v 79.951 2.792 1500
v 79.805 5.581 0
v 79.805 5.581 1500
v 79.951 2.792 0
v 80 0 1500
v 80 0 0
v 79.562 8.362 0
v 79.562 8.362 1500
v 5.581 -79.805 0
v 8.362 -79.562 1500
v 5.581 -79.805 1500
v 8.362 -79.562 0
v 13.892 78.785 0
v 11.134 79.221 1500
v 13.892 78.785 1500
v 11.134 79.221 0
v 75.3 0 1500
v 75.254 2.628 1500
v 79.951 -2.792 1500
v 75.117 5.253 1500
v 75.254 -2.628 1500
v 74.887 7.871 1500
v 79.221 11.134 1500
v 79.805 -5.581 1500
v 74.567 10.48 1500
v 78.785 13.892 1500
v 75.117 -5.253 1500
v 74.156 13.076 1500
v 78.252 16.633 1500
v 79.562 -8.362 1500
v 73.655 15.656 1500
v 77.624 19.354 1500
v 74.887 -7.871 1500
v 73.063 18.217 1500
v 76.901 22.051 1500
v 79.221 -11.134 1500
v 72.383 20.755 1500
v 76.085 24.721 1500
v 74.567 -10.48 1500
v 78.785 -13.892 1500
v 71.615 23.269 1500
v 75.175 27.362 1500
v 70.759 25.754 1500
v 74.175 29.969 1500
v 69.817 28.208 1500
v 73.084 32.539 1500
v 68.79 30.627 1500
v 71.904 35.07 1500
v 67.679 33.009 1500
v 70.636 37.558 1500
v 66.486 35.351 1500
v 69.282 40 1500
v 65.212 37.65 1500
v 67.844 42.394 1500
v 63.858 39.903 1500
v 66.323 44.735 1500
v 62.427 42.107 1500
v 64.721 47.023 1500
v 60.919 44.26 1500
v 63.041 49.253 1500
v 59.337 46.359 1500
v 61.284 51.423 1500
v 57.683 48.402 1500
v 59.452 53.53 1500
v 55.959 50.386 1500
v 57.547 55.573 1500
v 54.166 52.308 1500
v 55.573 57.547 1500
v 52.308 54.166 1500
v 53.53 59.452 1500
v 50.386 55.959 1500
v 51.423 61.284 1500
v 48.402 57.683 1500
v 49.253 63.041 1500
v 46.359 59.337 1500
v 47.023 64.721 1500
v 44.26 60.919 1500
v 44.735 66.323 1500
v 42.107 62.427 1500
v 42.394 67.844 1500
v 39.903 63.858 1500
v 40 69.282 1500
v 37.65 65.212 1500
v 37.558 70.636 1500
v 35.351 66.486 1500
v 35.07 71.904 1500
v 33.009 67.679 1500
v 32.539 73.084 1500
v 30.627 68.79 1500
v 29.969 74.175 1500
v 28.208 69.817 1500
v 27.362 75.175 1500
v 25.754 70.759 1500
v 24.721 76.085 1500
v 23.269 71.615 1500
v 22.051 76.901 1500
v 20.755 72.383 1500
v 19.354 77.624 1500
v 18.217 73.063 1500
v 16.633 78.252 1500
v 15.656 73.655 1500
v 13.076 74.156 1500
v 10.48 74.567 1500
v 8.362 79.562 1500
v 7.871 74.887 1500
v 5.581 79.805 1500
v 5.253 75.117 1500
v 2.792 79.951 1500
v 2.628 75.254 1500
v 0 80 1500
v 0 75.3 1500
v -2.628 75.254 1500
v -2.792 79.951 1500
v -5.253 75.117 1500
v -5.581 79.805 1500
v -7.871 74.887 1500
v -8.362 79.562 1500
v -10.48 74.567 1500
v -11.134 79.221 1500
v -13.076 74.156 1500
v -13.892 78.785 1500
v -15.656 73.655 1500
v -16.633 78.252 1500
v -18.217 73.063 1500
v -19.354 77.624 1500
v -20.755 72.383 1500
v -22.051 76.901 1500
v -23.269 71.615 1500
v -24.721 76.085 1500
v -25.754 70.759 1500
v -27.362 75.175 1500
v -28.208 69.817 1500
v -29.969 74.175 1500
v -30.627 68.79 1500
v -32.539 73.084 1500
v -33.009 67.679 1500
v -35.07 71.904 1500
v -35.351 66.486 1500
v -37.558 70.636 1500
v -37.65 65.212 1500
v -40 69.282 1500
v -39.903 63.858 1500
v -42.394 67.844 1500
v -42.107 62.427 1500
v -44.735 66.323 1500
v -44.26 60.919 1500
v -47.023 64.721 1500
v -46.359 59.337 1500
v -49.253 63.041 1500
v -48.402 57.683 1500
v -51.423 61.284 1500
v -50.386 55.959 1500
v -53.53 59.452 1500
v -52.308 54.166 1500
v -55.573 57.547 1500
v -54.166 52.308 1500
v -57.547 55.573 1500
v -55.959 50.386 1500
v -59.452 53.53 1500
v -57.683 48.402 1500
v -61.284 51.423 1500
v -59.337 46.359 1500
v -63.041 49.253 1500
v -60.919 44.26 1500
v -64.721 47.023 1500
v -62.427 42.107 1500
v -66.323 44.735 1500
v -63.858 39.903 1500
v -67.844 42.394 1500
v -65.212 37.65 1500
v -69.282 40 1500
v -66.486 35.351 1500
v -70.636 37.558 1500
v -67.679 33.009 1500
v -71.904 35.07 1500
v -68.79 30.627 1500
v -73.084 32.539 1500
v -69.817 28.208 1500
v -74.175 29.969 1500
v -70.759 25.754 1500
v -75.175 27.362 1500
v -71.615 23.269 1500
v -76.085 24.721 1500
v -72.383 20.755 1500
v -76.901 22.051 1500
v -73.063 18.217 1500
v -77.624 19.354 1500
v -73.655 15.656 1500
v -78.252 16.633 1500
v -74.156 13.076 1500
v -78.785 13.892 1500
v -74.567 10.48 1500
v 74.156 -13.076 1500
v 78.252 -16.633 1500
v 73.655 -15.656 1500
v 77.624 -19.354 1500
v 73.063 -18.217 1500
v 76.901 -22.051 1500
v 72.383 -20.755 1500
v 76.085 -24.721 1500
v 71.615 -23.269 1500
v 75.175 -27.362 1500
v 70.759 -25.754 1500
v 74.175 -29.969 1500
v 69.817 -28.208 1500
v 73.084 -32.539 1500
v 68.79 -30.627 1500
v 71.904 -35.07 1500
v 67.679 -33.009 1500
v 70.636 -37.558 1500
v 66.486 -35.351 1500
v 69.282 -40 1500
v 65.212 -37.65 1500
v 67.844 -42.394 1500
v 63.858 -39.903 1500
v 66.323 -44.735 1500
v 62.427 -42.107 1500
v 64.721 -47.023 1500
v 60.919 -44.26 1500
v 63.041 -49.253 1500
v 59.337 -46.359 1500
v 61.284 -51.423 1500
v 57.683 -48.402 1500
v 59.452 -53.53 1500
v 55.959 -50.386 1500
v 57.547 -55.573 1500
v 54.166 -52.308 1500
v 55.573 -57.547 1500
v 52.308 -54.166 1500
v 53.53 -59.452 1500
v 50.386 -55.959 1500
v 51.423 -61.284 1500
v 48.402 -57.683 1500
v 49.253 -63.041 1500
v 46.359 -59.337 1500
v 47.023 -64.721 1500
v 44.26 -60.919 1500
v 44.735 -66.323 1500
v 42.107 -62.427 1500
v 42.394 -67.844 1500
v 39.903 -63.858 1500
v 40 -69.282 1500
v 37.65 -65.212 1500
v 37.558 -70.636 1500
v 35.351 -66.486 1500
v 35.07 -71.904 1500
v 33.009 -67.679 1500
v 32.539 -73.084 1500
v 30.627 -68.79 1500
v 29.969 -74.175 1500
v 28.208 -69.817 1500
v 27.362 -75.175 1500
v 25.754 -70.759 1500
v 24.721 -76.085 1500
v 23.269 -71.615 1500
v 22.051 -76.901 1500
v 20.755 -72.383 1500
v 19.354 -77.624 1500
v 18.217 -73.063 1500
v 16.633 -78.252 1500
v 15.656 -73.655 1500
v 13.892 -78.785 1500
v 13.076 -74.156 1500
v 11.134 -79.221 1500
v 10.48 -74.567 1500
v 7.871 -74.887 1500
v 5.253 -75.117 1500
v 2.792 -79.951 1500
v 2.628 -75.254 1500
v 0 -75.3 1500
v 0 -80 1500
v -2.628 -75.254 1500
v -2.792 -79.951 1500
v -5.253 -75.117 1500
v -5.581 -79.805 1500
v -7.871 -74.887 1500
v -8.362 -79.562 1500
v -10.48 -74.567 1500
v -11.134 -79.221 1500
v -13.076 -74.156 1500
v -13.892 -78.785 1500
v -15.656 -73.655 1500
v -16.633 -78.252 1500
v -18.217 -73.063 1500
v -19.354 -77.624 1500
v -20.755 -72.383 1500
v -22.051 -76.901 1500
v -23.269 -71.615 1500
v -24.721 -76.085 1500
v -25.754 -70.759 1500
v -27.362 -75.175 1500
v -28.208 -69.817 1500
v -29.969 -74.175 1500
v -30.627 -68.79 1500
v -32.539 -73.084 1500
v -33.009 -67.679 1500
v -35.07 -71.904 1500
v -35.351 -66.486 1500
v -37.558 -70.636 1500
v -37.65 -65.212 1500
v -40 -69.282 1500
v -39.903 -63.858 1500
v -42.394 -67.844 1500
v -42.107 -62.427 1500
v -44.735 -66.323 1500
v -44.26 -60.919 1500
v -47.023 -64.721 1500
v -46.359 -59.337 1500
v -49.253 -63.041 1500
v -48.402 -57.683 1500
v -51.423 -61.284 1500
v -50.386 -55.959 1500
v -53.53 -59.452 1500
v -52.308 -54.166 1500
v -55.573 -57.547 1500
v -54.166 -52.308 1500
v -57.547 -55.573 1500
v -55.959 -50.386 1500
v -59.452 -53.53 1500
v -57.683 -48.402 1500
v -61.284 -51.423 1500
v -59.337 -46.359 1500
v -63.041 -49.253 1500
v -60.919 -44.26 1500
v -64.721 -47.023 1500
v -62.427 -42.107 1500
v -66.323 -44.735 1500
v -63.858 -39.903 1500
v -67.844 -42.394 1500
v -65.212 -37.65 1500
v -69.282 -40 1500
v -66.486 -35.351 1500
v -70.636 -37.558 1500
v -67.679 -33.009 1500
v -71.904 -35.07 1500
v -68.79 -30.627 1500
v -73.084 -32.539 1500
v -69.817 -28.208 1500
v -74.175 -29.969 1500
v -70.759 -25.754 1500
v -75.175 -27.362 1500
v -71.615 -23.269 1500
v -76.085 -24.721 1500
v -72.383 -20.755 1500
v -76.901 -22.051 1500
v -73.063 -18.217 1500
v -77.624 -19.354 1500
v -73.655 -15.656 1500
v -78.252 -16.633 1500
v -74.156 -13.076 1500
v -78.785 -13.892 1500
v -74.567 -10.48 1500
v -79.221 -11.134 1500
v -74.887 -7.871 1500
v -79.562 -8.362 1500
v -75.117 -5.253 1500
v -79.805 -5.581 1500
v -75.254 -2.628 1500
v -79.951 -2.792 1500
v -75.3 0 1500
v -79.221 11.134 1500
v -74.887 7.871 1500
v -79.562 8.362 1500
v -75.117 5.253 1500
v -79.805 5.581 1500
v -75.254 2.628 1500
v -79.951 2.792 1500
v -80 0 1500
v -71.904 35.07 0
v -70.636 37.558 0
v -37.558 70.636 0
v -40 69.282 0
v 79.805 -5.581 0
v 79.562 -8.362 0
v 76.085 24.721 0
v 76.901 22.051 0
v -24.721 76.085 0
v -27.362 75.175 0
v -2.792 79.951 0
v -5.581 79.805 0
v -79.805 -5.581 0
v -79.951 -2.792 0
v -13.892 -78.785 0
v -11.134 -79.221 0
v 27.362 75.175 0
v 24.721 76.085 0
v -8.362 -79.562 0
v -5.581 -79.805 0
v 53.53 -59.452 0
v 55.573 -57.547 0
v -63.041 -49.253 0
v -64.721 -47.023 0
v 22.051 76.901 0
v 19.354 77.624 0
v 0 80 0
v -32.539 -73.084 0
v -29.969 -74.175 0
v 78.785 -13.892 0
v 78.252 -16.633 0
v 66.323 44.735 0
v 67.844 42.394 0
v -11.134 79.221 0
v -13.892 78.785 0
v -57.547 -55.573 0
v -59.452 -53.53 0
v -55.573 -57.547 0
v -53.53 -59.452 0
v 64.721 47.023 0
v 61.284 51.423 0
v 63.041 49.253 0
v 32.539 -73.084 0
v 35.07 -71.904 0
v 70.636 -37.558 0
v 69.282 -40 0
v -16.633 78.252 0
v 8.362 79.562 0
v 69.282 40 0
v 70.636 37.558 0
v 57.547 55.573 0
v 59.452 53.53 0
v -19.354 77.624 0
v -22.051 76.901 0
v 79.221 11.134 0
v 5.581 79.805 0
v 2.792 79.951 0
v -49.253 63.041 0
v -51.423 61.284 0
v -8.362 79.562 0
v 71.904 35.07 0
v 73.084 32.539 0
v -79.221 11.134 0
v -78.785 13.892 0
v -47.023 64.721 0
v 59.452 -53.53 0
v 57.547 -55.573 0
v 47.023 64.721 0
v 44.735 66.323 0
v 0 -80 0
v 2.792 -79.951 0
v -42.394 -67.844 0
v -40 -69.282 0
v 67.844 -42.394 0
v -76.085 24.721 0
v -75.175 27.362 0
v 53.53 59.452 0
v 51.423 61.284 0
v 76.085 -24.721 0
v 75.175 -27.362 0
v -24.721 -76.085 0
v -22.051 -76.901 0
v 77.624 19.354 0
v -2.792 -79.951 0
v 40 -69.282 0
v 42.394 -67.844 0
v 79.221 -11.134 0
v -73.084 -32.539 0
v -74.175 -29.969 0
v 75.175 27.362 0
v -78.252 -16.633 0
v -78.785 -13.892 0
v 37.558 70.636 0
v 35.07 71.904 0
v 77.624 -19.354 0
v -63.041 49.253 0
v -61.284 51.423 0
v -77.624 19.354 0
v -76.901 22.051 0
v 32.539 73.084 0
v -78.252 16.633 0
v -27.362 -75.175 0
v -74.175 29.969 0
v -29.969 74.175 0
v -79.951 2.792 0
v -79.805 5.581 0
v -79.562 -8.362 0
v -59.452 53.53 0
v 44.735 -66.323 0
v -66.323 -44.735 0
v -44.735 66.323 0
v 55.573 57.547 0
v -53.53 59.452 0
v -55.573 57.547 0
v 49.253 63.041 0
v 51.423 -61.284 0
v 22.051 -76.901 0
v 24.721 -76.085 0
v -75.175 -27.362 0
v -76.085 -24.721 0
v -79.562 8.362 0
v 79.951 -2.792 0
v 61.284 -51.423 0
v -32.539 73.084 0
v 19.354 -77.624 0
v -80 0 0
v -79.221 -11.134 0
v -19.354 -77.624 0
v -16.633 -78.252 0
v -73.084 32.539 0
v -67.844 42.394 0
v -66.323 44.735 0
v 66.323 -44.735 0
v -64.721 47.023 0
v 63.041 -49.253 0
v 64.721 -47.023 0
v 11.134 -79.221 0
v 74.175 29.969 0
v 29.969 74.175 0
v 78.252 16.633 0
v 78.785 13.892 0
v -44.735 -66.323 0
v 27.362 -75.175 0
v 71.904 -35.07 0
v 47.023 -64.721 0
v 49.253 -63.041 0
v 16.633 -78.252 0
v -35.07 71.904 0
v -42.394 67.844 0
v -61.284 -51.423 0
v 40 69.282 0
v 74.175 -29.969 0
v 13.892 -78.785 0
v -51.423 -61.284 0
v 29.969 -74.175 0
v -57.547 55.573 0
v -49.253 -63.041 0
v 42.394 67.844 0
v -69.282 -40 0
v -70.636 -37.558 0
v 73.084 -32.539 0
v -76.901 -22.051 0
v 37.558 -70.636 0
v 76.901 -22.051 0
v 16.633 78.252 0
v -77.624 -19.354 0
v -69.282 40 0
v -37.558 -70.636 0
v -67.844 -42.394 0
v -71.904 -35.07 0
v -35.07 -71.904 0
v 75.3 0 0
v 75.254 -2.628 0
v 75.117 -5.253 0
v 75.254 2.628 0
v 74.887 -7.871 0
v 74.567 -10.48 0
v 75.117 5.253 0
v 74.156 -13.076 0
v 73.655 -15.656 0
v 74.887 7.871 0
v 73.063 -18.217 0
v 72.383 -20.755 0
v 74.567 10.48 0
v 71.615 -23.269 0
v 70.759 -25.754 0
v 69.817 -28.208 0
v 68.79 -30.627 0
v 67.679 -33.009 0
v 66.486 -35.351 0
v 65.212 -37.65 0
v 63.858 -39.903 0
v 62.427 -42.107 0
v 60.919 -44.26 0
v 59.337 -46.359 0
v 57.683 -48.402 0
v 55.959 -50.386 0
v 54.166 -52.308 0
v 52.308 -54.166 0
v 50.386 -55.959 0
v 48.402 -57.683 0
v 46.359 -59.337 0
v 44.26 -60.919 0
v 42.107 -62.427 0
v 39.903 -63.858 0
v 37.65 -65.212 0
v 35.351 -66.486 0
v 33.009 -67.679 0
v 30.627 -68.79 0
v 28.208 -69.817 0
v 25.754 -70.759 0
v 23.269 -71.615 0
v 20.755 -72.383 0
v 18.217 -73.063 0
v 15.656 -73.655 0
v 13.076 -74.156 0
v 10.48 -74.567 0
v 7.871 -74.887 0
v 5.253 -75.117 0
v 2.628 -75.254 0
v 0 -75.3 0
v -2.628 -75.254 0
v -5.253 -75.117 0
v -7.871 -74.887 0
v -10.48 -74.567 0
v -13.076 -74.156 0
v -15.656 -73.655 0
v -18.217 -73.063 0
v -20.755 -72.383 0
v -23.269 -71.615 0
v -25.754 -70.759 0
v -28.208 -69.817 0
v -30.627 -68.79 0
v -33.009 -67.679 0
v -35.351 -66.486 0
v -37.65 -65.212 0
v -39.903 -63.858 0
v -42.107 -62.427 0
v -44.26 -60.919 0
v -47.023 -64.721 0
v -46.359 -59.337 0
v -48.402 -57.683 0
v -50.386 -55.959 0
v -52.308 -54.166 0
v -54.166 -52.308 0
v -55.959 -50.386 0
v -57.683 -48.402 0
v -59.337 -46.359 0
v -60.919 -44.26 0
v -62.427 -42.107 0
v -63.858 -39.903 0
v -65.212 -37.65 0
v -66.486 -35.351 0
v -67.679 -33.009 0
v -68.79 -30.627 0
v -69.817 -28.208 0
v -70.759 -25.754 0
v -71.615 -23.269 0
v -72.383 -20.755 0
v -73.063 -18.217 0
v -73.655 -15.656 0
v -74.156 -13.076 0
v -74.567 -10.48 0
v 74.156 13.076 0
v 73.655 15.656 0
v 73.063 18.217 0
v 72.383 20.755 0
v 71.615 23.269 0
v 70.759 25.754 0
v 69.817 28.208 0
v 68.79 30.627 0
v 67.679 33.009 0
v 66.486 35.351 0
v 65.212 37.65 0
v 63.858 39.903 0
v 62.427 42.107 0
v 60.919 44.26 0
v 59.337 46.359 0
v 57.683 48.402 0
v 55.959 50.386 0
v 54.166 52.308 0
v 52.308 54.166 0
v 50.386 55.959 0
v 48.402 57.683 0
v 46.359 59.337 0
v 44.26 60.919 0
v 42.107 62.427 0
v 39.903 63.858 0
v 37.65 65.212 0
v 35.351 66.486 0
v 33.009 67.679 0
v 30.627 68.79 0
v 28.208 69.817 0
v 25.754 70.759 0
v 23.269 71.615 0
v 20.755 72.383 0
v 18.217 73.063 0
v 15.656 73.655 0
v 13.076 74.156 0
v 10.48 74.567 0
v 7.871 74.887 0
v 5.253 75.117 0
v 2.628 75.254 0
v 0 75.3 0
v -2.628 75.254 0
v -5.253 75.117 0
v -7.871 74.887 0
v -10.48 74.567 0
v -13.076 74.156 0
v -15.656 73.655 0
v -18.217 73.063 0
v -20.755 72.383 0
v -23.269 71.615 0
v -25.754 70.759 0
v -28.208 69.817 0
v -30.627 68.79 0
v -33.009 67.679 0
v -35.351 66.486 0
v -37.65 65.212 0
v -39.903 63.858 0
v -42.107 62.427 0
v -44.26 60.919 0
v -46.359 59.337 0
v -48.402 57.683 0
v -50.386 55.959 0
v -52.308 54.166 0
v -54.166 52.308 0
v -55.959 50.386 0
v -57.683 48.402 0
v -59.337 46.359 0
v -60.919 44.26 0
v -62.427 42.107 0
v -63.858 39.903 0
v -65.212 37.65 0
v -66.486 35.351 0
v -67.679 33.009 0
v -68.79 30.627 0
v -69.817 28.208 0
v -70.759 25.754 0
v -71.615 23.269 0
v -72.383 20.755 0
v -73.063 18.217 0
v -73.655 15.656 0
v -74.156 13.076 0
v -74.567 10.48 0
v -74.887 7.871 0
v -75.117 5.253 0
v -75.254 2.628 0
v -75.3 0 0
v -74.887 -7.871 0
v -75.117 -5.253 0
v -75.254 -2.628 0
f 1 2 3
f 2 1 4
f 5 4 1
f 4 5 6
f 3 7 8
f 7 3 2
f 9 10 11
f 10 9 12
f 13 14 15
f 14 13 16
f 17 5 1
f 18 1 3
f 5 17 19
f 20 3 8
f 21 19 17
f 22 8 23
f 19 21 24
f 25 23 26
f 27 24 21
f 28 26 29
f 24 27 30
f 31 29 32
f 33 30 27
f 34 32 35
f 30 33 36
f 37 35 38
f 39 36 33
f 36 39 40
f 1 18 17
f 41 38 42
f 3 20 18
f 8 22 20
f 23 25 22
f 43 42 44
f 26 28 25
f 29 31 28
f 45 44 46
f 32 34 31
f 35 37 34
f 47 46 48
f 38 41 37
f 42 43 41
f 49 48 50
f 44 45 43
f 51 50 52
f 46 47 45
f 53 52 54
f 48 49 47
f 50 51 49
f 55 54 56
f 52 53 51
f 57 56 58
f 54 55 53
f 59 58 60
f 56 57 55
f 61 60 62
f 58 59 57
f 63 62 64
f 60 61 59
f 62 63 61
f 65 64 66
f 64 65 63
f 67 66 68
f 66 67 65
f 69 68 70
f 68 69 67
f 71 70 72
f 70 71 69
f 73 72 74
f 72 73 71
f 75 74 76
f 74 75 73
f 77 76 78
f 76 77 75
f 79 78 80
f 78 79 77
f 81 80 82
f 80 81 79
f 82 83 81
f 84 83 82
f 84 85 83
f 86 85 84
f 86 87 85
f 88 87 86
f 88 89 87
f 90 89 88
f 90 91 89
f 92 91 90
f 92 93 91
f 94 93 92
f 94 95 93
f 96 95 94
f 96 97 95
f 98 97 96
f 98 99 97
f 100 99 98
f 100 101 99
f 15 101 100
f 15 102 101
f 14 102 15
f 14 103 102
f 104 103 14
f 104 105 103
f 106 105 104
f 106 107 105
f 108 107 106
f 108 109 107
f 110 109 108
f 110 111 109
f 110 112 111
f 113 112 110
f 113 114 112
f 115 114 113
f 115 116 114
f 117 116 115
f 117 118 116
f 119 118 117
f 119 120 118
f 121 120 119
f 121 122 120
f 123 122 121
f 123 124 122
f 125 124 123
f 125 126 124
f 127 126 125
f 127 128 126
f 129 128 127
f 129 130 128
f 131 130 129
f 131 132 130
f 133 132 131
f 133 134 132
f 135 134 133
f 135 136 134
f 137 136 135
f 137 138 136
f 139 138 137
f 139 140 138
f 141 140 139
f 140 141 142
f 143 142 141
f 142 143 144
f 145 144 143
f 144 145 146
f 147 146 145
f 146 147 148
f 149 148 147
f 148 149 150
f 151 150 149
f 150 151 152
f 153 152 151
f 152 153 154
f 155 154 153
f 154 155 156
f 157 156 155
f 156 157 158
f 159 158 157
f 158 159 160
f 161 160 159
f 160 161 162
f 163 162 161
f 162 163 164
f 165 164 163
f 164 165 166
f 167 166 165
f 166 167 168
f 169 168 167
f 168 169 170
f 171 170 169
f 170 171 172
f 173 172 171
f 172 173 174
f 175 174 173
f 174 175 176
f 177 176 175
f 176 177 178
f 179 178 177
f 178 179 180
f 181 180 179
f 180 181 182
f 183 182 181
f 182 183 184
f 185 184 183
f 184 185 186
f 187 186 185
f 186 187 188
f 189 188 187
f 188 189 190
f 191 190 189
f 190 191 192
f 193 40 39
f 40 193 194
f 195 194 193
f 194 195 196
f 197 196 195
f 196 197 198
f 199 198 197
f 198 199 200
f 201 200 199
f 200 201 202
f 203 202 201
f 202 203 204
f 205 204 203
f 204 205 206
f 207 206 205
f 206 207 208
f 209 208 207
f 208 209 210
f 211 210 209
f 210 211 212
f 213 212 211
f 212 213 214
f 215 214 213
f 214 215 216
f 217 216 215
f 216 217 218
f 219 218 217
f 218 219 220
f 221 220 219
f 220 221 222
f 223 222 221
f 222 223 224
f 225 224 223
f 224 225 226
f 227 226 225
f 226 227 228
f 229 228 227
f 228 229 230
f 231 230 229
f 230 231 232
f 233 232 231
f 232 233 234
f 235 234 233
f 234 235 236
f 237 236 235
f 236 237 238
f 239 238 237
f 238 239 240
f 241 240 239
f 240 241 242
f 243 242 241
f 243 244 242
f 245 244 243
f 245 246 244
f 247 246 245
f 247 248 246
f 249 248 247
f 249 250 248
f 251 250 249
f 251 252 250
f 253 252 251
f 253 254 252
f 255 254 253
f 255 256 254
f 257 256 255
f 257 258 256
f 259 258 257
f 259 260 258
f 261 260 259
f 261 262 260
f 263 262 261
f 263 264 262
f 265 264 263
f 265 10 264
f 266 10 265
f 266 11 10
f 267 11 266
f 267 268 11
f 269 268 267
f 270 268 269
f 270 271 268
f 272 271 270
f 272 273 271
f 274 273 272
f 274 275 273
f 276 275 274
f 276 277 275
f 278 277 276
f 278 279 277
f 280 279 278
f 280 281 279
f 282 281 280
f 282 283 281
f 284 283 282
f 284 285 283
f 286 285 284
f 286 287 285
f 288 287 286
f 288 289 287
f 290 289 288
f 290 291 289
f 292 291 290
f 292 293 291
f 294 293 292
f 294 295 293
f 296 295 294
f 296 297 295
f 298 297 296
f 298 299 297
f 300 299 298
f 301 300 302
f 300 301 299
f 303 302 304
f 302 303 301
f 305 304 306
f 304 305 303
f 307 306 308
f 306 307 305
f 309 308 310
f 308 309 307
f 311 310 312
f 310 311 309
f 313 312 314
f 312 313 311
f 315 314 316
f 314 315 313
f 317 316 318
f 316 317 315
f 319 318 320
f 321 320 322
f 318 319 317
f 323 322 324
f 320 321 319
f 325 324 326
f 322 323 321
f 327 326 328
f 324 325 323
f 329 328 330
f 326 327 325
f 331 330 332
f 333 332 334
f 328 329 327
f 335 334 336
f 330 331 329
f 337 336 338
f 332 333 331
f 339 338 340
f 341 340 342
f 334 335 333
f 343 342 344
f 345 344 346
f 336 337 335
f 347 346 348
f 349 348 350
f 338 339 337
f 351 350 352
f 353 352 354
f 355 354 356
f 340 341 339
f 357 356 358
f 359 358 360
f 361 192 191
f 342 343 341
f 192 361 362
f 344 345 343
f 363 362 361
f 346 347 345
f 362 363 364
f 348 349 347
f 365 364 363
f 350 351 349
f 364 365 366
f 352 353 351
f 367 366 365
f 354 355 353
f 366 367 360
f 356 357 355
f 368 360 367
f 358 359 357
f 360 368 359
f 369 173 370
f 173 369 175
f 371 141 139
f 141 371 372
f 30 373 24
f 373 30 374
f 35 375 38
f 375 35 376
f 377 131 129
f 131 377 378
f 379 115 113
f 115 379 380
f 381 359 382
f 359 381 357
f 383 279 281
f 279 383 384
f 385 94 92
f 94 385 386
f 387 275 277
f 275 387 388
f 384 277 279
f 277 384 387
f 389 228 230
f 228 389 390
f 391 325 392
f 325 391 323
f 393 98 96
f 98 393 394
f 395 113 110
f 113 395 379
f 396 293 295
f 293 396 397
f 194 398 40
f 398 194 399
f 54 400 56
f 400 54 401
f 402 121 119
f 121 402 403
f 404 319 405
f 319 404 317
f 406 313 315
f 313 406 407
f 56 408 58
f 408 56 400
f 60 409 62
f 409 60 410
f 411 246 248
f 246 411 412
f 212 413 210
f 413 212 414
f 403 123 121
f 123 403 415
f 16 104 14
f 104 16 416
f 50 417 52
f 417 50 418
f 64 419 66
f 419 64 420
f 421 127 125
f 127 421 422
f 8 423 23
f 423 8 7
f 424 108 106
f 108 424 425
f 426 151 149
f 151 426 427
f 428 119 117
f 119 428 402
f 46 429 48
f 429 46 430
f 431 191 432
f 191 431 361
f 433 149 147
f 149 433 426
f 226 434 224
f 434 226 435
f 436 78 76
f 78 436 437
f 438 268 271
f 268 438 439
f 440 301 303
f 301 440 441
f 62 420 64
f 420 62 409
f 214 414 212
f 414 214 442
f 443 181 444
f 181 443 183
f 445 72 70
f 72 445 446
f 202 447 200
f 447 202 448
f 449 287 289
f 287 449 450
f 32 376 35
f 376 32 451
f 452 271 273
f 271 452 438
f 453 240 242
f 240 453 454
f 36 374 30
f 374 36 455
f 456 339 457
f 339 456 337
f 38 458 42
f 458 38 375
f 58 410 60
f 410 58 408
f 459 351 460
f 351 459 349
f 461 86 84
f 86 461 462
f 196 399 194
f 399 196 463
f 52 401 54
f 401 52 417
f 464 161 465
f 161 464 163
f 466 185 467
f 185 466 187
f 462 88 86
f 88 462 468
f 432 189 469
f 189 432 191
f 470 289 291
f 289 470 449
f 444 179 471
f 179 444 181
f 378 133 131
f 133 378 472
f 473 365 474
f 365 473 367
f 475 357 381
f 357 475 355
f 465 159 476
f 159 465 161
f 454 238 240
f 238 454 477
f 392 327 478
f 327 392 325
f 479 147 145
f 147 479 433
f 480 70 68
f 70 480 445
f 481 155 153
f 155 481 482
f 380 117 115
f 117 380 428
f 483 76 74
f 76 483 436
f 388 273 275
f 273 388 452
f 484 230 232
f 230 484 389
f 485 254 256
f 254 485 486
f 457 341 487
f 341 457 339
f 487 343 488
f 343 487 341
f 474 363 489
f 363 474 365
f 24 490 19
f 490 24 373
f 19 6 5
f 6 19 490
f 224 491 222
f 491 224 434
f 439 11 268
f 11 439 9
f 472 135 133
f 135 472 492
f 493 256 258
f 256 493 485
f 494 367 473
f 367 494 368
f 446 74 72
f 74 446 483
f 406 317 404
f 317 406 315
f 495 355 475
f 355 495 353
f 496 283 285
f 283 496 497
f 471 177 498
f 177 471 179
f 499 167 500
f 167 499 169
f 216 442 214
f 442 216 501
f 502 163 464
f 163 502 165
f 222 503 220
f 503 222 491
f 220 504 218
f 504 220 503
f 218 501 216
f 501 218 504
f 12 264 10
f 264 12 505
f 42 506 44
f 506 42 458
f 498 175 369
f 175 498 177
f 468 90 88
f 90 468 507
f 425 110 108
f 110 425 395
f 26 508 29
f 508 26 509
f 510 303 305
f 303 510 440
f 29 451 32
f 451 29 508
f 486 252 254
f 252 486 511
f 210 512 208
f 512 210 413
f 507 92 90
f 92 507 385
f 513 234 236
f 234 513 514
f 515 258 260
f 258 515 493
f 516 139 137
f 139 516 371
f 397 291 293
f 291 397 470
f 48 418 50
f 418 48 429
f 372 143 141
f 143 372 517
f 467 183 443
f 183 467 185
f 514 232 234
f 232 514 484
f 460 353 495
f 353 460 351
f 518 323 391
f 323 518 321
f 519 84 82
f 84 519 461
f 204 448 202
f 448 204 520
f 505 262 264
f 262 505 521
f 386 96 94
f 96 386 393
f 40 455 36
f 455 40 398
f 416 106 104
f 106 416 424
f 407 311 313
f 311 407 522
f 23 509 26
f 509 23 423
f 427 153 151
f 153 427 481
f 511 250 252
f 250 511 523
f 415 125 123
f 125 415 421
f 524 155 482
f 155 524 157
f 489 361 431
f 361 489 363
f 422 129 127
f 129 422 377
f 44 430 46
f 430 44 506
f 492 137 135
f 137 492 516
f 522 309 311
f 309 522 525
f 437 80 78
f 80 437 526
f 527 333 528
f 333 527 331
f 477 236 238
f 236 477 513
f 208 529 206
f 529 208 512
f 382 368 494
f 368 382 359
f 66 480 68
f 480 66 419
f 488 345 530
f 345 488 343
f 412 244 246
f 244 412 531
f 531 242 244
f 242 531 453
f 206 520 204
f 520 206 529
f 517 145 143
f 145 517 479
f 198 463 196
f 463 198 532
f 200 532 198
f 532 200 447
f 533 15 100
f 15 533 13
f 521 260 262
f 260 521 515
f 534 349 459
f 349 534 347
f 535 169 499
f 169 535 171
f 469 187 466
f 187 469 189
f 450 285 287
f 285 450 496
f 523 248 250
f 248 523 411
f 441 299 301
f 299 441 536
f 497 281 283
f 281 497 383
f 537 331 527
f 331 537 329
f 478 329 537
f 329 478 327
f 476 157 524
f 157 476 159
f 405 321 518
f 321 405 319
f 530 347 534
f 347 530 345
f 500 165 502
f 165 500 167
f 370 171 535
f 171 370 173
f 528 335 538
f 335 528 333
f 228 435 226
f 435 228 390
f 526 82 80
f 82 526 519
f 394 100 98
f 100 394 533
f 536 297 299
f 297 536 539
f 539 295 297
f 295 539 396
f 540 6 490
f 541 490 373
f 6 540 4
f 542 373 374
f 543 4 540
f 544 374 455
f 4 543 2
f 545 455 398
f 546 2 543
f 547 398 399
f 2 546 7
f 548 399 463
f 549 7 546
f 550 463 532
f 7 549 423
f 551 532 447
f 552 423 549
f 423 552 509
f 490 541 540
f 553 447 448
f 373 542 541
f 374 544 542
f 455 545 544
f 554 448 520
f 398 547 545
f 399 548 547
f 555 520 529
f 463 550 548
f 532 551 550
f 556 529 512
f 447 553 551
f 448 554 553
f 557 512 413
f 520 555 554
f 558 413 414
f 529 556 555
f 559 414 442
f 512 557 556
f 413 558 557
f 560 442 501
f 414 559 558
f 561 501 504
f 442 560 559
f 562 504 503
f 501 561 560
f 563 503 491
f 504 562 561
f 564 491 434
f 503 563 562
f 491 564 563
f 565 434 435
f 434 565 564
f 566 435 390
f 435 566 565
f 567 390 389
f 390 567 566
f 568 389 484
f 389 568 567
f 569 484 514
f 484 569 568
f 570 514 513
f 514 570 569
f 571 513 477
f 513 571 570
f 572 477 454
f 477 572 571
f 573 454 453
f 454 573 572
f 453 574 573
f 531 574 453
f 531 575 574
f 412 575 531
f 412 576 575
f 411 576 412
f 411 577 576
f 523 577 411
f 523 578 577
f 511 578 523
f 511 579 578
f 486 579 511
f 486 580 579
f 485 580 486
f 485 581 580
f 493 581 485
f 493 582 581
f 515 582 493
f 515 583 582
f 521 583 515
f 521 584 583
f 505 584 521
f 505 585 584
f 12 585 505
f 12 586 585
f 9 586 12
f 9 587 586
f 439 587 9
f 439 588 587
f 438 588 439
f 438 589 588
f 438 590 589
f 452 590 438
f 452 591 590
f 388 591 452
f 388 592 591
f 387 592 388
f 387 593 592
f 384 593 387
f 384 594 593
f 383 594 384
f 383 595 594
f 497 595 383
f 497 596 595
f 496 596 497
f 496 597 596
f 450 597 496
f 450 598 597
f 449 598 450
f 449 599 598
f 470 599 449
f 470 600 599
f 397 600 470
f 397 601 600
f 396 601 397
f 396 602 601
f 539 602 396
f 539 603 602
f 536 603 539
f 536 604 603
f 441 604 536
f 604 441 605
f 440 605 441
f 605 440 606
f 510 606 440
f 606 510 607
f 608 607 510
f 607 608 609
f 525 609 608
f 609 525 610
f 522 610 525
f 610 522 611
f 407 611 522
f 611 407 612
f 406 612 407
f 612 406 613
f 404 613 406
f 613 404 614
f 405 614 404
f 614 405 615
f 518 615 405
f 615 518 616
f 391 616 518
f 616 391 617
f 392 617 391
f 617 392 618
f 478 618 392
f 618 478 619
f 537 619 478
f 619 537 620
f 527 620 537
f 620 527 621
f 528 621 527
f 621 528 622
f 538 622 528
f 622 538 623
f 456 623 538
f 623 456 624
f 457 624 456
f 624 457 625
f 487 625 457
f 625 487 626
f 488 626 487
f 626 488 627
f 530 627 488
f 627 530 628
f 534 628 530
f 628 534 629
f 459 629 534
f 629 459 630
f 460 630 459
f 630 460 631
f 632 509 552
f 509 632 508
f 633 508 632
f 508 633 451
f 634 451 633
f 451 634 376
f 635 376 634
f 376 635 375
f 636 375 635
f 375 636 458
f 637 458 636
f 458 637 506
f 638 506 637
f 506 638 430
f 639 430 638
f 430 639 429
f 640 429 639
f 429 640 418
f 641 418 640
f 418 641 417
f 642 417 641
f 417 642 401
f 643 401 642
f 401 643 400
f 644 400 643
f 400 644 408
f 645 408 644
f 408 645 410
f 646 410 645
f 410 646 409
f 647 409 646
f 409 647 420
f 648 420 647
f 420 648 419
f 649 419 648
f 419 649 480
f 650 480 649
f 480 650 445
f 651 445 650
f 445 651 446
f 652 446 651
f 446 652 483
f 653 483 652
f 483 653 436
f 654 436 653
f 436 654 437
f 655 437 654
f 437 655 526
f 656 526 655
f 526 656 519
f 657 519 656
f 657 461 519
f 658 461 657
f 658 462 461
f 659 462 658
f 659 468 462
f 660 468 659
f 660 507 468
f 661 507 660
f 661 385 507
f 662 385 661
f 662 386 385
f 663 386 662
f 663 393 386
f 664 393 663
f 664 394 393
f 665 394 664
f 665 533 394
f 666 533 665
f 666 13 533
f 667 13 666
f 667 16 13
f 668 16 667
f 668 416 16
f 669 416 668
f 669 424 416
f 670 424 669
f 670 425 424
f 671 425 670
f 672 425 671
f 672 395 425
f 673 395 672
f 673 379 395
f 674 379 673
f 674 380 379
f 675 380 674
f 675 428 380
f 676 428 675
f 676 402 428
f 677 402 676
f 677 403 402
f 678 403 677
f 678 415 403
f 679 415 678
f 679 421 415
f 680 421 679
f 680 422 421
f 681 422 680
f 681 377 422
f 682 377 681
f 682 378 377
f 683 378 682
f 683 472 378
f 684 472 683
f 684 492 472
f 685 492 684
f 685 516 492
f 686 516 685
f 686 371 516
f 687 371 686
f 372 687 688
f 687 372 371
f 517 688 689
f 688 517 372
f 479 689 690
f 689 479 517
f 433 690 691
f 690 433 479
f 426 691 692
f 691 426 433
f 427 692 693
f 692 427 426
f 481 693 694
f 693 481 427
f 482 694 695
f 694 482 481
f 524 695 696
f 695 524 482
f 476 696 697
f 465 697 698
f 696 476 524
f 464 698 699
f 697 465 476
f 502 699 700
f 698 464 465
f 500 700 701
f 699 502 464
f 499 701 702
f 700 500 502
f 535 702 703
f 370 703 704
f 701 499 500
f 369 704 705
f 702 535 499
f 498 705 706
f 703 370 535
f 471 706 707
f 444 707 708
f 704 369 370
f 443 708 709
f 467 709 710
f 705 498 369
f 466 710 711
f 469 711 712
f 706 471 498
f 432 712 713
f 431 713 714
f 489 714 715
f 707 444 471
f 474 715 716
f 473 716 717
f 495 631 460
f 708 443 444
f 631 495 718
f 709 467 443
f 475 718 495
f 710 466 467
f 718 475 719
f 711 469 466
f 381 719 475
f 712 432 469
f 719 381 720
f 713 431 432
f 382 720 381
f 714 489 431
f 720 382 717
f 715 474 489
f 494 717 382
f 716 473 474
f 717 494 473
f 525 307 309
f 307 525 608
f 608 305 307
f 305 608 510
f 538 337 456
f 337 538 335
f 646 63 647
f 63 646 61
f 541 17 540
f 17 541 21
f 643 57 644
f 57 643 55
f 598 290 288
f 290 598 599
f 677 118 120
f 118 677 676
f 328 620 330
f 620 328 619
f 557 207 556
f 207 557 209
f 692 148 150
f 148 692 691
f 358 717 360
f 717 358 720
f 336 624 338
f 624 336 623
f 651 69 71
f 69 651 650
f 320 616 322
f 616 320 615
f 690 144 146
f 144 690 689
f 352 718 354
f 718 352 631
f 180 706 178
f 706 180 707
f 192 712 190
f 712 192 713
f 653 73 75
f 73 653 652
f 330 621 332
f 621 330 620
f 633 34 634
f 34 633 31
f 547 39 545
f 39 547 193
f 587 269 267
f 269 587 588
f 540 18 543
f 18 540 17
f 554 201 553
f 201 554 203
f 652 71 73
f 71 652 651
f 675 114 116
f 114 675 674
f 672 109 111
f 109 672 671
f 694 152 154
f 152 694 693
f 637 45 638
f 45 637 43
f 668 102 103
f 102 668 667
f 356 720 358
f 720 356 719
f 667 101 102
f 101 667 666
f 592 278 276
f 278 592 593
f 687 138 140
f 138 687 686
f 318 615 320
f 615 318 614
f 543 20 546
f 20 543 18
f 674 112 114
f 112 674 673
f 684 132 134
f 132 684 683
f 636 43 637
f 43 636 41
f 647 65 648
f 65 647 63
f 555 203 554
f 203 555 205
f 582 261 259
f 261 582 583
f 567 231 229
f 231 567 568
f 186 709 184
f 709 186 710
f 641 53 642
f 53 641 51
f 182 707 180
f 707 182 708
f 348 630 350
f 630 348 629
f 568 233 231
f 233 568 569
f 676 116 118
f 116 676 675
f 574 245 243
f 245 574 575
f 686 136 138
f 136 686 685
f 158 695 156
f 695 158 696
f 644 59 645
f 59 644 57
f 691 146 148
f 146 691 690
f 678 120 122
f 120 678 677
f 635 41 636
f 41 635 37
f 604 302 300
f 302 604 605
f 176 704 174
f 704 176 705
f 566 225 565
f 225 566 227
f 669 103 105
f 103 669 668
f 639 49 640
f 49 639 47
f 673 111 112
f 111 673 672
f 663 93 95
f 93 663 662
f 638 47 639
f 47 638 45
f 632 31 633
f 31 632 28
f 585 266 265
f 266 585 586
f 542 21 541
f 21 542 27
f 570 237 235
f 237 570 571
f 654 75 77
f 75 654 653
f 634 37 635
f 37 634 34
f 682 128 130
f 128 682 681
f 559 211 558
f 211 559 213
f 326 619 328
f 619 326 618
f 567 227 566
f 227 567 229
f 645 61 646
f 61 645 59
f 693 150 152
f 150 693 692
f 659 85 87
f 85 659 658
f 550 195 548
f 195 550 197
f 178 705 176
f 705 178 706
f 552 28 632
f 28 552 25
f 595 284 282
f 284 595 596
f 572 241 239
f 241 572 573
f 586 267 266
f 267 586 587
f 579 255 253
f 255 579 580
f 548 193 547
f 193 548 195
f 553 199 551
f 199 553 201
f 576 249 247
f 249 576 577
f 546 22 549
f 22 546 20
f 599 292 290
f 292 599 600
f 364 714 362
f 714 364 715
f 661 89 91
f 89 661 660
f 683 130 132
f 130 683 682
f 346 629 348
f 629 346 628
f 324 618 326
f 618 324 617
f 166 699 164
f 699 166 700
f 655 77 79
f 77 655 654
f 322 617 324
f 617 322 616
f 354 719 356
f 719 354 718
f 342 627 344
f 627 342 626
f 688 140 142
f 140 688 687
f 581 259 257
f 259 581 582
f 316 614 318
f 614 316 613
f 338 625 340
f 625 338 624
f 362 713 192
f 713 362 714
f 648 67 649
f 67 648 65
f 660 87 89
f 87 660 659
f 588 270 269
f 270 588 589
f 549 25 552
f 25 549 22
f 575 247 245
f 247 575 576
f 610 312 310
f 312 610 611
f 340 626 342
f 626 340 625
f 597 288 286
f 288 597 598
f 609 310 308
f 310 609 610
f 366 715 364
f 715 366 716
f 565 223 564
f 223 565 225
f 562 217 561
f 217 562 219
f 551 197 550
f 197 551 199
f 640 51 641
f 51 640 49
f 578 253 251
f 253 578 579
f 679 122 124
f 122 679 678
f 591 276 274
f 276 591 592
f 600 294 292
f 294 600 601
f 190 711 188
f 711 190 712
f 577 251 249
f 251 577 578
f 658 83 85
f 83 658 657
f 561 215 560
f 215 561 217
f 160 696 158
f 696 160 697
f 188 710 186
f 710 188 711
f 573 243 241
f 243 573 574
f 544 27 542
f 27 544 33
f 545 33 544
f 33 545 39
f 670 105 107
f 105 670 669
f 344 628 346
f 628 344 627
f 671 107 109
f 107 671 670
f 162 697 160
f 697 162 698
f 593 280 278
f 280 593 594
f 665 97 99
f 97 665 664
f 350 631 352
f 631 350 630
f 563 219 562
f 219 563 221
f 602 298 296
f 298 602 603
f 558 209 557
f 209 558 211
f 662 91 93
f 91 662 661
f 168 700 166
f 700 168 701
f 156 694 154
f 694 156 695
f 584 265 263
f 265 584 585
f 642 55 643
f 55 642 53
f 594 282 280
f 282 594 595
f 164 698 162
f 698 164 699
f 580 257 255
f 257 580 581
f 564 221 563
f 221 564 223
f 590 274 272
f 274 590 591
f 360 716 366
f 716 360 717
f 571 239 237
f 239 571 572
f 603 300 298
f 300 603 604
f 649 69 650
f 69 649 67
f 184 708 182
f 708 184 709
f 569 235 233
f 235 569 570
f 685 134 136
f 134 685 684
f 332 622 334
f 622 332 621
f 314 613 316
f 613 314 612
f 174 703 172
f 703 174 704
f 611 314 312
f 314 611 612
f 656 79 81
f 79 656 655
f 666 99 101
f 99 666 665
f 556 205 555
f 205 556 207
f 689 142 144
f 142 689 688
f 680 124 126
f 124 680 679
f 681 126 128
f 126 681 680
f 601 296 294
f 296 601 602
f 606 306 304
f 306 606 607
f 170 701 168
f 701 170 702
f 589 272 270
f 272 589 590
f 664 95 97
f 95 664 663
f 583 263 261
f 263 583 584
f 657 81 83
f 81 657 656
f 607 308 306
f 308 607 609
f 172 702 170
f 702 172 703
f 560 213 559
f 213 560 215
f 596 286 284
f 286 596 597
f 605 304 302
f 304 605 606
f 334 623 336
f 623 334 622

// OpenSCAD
$fn = 180;

// HT pipe parameters (mm)
outer_d = 160;
length  = 1500;

// Typical HT (house drainage) wall thickness approximation (mm)
wall = 4.7;

inner_d = outer_d - 2*wall;

module ht_pipe(od, id, L) {
    difference() {
        cylinder(h = L, d = od, center = false);
        translate([0,0,-0.1])
            cylinder(h = L + 0.2, d = id, center = false);
    }
}

ht_pipe(outer_d, inner_d, length);
